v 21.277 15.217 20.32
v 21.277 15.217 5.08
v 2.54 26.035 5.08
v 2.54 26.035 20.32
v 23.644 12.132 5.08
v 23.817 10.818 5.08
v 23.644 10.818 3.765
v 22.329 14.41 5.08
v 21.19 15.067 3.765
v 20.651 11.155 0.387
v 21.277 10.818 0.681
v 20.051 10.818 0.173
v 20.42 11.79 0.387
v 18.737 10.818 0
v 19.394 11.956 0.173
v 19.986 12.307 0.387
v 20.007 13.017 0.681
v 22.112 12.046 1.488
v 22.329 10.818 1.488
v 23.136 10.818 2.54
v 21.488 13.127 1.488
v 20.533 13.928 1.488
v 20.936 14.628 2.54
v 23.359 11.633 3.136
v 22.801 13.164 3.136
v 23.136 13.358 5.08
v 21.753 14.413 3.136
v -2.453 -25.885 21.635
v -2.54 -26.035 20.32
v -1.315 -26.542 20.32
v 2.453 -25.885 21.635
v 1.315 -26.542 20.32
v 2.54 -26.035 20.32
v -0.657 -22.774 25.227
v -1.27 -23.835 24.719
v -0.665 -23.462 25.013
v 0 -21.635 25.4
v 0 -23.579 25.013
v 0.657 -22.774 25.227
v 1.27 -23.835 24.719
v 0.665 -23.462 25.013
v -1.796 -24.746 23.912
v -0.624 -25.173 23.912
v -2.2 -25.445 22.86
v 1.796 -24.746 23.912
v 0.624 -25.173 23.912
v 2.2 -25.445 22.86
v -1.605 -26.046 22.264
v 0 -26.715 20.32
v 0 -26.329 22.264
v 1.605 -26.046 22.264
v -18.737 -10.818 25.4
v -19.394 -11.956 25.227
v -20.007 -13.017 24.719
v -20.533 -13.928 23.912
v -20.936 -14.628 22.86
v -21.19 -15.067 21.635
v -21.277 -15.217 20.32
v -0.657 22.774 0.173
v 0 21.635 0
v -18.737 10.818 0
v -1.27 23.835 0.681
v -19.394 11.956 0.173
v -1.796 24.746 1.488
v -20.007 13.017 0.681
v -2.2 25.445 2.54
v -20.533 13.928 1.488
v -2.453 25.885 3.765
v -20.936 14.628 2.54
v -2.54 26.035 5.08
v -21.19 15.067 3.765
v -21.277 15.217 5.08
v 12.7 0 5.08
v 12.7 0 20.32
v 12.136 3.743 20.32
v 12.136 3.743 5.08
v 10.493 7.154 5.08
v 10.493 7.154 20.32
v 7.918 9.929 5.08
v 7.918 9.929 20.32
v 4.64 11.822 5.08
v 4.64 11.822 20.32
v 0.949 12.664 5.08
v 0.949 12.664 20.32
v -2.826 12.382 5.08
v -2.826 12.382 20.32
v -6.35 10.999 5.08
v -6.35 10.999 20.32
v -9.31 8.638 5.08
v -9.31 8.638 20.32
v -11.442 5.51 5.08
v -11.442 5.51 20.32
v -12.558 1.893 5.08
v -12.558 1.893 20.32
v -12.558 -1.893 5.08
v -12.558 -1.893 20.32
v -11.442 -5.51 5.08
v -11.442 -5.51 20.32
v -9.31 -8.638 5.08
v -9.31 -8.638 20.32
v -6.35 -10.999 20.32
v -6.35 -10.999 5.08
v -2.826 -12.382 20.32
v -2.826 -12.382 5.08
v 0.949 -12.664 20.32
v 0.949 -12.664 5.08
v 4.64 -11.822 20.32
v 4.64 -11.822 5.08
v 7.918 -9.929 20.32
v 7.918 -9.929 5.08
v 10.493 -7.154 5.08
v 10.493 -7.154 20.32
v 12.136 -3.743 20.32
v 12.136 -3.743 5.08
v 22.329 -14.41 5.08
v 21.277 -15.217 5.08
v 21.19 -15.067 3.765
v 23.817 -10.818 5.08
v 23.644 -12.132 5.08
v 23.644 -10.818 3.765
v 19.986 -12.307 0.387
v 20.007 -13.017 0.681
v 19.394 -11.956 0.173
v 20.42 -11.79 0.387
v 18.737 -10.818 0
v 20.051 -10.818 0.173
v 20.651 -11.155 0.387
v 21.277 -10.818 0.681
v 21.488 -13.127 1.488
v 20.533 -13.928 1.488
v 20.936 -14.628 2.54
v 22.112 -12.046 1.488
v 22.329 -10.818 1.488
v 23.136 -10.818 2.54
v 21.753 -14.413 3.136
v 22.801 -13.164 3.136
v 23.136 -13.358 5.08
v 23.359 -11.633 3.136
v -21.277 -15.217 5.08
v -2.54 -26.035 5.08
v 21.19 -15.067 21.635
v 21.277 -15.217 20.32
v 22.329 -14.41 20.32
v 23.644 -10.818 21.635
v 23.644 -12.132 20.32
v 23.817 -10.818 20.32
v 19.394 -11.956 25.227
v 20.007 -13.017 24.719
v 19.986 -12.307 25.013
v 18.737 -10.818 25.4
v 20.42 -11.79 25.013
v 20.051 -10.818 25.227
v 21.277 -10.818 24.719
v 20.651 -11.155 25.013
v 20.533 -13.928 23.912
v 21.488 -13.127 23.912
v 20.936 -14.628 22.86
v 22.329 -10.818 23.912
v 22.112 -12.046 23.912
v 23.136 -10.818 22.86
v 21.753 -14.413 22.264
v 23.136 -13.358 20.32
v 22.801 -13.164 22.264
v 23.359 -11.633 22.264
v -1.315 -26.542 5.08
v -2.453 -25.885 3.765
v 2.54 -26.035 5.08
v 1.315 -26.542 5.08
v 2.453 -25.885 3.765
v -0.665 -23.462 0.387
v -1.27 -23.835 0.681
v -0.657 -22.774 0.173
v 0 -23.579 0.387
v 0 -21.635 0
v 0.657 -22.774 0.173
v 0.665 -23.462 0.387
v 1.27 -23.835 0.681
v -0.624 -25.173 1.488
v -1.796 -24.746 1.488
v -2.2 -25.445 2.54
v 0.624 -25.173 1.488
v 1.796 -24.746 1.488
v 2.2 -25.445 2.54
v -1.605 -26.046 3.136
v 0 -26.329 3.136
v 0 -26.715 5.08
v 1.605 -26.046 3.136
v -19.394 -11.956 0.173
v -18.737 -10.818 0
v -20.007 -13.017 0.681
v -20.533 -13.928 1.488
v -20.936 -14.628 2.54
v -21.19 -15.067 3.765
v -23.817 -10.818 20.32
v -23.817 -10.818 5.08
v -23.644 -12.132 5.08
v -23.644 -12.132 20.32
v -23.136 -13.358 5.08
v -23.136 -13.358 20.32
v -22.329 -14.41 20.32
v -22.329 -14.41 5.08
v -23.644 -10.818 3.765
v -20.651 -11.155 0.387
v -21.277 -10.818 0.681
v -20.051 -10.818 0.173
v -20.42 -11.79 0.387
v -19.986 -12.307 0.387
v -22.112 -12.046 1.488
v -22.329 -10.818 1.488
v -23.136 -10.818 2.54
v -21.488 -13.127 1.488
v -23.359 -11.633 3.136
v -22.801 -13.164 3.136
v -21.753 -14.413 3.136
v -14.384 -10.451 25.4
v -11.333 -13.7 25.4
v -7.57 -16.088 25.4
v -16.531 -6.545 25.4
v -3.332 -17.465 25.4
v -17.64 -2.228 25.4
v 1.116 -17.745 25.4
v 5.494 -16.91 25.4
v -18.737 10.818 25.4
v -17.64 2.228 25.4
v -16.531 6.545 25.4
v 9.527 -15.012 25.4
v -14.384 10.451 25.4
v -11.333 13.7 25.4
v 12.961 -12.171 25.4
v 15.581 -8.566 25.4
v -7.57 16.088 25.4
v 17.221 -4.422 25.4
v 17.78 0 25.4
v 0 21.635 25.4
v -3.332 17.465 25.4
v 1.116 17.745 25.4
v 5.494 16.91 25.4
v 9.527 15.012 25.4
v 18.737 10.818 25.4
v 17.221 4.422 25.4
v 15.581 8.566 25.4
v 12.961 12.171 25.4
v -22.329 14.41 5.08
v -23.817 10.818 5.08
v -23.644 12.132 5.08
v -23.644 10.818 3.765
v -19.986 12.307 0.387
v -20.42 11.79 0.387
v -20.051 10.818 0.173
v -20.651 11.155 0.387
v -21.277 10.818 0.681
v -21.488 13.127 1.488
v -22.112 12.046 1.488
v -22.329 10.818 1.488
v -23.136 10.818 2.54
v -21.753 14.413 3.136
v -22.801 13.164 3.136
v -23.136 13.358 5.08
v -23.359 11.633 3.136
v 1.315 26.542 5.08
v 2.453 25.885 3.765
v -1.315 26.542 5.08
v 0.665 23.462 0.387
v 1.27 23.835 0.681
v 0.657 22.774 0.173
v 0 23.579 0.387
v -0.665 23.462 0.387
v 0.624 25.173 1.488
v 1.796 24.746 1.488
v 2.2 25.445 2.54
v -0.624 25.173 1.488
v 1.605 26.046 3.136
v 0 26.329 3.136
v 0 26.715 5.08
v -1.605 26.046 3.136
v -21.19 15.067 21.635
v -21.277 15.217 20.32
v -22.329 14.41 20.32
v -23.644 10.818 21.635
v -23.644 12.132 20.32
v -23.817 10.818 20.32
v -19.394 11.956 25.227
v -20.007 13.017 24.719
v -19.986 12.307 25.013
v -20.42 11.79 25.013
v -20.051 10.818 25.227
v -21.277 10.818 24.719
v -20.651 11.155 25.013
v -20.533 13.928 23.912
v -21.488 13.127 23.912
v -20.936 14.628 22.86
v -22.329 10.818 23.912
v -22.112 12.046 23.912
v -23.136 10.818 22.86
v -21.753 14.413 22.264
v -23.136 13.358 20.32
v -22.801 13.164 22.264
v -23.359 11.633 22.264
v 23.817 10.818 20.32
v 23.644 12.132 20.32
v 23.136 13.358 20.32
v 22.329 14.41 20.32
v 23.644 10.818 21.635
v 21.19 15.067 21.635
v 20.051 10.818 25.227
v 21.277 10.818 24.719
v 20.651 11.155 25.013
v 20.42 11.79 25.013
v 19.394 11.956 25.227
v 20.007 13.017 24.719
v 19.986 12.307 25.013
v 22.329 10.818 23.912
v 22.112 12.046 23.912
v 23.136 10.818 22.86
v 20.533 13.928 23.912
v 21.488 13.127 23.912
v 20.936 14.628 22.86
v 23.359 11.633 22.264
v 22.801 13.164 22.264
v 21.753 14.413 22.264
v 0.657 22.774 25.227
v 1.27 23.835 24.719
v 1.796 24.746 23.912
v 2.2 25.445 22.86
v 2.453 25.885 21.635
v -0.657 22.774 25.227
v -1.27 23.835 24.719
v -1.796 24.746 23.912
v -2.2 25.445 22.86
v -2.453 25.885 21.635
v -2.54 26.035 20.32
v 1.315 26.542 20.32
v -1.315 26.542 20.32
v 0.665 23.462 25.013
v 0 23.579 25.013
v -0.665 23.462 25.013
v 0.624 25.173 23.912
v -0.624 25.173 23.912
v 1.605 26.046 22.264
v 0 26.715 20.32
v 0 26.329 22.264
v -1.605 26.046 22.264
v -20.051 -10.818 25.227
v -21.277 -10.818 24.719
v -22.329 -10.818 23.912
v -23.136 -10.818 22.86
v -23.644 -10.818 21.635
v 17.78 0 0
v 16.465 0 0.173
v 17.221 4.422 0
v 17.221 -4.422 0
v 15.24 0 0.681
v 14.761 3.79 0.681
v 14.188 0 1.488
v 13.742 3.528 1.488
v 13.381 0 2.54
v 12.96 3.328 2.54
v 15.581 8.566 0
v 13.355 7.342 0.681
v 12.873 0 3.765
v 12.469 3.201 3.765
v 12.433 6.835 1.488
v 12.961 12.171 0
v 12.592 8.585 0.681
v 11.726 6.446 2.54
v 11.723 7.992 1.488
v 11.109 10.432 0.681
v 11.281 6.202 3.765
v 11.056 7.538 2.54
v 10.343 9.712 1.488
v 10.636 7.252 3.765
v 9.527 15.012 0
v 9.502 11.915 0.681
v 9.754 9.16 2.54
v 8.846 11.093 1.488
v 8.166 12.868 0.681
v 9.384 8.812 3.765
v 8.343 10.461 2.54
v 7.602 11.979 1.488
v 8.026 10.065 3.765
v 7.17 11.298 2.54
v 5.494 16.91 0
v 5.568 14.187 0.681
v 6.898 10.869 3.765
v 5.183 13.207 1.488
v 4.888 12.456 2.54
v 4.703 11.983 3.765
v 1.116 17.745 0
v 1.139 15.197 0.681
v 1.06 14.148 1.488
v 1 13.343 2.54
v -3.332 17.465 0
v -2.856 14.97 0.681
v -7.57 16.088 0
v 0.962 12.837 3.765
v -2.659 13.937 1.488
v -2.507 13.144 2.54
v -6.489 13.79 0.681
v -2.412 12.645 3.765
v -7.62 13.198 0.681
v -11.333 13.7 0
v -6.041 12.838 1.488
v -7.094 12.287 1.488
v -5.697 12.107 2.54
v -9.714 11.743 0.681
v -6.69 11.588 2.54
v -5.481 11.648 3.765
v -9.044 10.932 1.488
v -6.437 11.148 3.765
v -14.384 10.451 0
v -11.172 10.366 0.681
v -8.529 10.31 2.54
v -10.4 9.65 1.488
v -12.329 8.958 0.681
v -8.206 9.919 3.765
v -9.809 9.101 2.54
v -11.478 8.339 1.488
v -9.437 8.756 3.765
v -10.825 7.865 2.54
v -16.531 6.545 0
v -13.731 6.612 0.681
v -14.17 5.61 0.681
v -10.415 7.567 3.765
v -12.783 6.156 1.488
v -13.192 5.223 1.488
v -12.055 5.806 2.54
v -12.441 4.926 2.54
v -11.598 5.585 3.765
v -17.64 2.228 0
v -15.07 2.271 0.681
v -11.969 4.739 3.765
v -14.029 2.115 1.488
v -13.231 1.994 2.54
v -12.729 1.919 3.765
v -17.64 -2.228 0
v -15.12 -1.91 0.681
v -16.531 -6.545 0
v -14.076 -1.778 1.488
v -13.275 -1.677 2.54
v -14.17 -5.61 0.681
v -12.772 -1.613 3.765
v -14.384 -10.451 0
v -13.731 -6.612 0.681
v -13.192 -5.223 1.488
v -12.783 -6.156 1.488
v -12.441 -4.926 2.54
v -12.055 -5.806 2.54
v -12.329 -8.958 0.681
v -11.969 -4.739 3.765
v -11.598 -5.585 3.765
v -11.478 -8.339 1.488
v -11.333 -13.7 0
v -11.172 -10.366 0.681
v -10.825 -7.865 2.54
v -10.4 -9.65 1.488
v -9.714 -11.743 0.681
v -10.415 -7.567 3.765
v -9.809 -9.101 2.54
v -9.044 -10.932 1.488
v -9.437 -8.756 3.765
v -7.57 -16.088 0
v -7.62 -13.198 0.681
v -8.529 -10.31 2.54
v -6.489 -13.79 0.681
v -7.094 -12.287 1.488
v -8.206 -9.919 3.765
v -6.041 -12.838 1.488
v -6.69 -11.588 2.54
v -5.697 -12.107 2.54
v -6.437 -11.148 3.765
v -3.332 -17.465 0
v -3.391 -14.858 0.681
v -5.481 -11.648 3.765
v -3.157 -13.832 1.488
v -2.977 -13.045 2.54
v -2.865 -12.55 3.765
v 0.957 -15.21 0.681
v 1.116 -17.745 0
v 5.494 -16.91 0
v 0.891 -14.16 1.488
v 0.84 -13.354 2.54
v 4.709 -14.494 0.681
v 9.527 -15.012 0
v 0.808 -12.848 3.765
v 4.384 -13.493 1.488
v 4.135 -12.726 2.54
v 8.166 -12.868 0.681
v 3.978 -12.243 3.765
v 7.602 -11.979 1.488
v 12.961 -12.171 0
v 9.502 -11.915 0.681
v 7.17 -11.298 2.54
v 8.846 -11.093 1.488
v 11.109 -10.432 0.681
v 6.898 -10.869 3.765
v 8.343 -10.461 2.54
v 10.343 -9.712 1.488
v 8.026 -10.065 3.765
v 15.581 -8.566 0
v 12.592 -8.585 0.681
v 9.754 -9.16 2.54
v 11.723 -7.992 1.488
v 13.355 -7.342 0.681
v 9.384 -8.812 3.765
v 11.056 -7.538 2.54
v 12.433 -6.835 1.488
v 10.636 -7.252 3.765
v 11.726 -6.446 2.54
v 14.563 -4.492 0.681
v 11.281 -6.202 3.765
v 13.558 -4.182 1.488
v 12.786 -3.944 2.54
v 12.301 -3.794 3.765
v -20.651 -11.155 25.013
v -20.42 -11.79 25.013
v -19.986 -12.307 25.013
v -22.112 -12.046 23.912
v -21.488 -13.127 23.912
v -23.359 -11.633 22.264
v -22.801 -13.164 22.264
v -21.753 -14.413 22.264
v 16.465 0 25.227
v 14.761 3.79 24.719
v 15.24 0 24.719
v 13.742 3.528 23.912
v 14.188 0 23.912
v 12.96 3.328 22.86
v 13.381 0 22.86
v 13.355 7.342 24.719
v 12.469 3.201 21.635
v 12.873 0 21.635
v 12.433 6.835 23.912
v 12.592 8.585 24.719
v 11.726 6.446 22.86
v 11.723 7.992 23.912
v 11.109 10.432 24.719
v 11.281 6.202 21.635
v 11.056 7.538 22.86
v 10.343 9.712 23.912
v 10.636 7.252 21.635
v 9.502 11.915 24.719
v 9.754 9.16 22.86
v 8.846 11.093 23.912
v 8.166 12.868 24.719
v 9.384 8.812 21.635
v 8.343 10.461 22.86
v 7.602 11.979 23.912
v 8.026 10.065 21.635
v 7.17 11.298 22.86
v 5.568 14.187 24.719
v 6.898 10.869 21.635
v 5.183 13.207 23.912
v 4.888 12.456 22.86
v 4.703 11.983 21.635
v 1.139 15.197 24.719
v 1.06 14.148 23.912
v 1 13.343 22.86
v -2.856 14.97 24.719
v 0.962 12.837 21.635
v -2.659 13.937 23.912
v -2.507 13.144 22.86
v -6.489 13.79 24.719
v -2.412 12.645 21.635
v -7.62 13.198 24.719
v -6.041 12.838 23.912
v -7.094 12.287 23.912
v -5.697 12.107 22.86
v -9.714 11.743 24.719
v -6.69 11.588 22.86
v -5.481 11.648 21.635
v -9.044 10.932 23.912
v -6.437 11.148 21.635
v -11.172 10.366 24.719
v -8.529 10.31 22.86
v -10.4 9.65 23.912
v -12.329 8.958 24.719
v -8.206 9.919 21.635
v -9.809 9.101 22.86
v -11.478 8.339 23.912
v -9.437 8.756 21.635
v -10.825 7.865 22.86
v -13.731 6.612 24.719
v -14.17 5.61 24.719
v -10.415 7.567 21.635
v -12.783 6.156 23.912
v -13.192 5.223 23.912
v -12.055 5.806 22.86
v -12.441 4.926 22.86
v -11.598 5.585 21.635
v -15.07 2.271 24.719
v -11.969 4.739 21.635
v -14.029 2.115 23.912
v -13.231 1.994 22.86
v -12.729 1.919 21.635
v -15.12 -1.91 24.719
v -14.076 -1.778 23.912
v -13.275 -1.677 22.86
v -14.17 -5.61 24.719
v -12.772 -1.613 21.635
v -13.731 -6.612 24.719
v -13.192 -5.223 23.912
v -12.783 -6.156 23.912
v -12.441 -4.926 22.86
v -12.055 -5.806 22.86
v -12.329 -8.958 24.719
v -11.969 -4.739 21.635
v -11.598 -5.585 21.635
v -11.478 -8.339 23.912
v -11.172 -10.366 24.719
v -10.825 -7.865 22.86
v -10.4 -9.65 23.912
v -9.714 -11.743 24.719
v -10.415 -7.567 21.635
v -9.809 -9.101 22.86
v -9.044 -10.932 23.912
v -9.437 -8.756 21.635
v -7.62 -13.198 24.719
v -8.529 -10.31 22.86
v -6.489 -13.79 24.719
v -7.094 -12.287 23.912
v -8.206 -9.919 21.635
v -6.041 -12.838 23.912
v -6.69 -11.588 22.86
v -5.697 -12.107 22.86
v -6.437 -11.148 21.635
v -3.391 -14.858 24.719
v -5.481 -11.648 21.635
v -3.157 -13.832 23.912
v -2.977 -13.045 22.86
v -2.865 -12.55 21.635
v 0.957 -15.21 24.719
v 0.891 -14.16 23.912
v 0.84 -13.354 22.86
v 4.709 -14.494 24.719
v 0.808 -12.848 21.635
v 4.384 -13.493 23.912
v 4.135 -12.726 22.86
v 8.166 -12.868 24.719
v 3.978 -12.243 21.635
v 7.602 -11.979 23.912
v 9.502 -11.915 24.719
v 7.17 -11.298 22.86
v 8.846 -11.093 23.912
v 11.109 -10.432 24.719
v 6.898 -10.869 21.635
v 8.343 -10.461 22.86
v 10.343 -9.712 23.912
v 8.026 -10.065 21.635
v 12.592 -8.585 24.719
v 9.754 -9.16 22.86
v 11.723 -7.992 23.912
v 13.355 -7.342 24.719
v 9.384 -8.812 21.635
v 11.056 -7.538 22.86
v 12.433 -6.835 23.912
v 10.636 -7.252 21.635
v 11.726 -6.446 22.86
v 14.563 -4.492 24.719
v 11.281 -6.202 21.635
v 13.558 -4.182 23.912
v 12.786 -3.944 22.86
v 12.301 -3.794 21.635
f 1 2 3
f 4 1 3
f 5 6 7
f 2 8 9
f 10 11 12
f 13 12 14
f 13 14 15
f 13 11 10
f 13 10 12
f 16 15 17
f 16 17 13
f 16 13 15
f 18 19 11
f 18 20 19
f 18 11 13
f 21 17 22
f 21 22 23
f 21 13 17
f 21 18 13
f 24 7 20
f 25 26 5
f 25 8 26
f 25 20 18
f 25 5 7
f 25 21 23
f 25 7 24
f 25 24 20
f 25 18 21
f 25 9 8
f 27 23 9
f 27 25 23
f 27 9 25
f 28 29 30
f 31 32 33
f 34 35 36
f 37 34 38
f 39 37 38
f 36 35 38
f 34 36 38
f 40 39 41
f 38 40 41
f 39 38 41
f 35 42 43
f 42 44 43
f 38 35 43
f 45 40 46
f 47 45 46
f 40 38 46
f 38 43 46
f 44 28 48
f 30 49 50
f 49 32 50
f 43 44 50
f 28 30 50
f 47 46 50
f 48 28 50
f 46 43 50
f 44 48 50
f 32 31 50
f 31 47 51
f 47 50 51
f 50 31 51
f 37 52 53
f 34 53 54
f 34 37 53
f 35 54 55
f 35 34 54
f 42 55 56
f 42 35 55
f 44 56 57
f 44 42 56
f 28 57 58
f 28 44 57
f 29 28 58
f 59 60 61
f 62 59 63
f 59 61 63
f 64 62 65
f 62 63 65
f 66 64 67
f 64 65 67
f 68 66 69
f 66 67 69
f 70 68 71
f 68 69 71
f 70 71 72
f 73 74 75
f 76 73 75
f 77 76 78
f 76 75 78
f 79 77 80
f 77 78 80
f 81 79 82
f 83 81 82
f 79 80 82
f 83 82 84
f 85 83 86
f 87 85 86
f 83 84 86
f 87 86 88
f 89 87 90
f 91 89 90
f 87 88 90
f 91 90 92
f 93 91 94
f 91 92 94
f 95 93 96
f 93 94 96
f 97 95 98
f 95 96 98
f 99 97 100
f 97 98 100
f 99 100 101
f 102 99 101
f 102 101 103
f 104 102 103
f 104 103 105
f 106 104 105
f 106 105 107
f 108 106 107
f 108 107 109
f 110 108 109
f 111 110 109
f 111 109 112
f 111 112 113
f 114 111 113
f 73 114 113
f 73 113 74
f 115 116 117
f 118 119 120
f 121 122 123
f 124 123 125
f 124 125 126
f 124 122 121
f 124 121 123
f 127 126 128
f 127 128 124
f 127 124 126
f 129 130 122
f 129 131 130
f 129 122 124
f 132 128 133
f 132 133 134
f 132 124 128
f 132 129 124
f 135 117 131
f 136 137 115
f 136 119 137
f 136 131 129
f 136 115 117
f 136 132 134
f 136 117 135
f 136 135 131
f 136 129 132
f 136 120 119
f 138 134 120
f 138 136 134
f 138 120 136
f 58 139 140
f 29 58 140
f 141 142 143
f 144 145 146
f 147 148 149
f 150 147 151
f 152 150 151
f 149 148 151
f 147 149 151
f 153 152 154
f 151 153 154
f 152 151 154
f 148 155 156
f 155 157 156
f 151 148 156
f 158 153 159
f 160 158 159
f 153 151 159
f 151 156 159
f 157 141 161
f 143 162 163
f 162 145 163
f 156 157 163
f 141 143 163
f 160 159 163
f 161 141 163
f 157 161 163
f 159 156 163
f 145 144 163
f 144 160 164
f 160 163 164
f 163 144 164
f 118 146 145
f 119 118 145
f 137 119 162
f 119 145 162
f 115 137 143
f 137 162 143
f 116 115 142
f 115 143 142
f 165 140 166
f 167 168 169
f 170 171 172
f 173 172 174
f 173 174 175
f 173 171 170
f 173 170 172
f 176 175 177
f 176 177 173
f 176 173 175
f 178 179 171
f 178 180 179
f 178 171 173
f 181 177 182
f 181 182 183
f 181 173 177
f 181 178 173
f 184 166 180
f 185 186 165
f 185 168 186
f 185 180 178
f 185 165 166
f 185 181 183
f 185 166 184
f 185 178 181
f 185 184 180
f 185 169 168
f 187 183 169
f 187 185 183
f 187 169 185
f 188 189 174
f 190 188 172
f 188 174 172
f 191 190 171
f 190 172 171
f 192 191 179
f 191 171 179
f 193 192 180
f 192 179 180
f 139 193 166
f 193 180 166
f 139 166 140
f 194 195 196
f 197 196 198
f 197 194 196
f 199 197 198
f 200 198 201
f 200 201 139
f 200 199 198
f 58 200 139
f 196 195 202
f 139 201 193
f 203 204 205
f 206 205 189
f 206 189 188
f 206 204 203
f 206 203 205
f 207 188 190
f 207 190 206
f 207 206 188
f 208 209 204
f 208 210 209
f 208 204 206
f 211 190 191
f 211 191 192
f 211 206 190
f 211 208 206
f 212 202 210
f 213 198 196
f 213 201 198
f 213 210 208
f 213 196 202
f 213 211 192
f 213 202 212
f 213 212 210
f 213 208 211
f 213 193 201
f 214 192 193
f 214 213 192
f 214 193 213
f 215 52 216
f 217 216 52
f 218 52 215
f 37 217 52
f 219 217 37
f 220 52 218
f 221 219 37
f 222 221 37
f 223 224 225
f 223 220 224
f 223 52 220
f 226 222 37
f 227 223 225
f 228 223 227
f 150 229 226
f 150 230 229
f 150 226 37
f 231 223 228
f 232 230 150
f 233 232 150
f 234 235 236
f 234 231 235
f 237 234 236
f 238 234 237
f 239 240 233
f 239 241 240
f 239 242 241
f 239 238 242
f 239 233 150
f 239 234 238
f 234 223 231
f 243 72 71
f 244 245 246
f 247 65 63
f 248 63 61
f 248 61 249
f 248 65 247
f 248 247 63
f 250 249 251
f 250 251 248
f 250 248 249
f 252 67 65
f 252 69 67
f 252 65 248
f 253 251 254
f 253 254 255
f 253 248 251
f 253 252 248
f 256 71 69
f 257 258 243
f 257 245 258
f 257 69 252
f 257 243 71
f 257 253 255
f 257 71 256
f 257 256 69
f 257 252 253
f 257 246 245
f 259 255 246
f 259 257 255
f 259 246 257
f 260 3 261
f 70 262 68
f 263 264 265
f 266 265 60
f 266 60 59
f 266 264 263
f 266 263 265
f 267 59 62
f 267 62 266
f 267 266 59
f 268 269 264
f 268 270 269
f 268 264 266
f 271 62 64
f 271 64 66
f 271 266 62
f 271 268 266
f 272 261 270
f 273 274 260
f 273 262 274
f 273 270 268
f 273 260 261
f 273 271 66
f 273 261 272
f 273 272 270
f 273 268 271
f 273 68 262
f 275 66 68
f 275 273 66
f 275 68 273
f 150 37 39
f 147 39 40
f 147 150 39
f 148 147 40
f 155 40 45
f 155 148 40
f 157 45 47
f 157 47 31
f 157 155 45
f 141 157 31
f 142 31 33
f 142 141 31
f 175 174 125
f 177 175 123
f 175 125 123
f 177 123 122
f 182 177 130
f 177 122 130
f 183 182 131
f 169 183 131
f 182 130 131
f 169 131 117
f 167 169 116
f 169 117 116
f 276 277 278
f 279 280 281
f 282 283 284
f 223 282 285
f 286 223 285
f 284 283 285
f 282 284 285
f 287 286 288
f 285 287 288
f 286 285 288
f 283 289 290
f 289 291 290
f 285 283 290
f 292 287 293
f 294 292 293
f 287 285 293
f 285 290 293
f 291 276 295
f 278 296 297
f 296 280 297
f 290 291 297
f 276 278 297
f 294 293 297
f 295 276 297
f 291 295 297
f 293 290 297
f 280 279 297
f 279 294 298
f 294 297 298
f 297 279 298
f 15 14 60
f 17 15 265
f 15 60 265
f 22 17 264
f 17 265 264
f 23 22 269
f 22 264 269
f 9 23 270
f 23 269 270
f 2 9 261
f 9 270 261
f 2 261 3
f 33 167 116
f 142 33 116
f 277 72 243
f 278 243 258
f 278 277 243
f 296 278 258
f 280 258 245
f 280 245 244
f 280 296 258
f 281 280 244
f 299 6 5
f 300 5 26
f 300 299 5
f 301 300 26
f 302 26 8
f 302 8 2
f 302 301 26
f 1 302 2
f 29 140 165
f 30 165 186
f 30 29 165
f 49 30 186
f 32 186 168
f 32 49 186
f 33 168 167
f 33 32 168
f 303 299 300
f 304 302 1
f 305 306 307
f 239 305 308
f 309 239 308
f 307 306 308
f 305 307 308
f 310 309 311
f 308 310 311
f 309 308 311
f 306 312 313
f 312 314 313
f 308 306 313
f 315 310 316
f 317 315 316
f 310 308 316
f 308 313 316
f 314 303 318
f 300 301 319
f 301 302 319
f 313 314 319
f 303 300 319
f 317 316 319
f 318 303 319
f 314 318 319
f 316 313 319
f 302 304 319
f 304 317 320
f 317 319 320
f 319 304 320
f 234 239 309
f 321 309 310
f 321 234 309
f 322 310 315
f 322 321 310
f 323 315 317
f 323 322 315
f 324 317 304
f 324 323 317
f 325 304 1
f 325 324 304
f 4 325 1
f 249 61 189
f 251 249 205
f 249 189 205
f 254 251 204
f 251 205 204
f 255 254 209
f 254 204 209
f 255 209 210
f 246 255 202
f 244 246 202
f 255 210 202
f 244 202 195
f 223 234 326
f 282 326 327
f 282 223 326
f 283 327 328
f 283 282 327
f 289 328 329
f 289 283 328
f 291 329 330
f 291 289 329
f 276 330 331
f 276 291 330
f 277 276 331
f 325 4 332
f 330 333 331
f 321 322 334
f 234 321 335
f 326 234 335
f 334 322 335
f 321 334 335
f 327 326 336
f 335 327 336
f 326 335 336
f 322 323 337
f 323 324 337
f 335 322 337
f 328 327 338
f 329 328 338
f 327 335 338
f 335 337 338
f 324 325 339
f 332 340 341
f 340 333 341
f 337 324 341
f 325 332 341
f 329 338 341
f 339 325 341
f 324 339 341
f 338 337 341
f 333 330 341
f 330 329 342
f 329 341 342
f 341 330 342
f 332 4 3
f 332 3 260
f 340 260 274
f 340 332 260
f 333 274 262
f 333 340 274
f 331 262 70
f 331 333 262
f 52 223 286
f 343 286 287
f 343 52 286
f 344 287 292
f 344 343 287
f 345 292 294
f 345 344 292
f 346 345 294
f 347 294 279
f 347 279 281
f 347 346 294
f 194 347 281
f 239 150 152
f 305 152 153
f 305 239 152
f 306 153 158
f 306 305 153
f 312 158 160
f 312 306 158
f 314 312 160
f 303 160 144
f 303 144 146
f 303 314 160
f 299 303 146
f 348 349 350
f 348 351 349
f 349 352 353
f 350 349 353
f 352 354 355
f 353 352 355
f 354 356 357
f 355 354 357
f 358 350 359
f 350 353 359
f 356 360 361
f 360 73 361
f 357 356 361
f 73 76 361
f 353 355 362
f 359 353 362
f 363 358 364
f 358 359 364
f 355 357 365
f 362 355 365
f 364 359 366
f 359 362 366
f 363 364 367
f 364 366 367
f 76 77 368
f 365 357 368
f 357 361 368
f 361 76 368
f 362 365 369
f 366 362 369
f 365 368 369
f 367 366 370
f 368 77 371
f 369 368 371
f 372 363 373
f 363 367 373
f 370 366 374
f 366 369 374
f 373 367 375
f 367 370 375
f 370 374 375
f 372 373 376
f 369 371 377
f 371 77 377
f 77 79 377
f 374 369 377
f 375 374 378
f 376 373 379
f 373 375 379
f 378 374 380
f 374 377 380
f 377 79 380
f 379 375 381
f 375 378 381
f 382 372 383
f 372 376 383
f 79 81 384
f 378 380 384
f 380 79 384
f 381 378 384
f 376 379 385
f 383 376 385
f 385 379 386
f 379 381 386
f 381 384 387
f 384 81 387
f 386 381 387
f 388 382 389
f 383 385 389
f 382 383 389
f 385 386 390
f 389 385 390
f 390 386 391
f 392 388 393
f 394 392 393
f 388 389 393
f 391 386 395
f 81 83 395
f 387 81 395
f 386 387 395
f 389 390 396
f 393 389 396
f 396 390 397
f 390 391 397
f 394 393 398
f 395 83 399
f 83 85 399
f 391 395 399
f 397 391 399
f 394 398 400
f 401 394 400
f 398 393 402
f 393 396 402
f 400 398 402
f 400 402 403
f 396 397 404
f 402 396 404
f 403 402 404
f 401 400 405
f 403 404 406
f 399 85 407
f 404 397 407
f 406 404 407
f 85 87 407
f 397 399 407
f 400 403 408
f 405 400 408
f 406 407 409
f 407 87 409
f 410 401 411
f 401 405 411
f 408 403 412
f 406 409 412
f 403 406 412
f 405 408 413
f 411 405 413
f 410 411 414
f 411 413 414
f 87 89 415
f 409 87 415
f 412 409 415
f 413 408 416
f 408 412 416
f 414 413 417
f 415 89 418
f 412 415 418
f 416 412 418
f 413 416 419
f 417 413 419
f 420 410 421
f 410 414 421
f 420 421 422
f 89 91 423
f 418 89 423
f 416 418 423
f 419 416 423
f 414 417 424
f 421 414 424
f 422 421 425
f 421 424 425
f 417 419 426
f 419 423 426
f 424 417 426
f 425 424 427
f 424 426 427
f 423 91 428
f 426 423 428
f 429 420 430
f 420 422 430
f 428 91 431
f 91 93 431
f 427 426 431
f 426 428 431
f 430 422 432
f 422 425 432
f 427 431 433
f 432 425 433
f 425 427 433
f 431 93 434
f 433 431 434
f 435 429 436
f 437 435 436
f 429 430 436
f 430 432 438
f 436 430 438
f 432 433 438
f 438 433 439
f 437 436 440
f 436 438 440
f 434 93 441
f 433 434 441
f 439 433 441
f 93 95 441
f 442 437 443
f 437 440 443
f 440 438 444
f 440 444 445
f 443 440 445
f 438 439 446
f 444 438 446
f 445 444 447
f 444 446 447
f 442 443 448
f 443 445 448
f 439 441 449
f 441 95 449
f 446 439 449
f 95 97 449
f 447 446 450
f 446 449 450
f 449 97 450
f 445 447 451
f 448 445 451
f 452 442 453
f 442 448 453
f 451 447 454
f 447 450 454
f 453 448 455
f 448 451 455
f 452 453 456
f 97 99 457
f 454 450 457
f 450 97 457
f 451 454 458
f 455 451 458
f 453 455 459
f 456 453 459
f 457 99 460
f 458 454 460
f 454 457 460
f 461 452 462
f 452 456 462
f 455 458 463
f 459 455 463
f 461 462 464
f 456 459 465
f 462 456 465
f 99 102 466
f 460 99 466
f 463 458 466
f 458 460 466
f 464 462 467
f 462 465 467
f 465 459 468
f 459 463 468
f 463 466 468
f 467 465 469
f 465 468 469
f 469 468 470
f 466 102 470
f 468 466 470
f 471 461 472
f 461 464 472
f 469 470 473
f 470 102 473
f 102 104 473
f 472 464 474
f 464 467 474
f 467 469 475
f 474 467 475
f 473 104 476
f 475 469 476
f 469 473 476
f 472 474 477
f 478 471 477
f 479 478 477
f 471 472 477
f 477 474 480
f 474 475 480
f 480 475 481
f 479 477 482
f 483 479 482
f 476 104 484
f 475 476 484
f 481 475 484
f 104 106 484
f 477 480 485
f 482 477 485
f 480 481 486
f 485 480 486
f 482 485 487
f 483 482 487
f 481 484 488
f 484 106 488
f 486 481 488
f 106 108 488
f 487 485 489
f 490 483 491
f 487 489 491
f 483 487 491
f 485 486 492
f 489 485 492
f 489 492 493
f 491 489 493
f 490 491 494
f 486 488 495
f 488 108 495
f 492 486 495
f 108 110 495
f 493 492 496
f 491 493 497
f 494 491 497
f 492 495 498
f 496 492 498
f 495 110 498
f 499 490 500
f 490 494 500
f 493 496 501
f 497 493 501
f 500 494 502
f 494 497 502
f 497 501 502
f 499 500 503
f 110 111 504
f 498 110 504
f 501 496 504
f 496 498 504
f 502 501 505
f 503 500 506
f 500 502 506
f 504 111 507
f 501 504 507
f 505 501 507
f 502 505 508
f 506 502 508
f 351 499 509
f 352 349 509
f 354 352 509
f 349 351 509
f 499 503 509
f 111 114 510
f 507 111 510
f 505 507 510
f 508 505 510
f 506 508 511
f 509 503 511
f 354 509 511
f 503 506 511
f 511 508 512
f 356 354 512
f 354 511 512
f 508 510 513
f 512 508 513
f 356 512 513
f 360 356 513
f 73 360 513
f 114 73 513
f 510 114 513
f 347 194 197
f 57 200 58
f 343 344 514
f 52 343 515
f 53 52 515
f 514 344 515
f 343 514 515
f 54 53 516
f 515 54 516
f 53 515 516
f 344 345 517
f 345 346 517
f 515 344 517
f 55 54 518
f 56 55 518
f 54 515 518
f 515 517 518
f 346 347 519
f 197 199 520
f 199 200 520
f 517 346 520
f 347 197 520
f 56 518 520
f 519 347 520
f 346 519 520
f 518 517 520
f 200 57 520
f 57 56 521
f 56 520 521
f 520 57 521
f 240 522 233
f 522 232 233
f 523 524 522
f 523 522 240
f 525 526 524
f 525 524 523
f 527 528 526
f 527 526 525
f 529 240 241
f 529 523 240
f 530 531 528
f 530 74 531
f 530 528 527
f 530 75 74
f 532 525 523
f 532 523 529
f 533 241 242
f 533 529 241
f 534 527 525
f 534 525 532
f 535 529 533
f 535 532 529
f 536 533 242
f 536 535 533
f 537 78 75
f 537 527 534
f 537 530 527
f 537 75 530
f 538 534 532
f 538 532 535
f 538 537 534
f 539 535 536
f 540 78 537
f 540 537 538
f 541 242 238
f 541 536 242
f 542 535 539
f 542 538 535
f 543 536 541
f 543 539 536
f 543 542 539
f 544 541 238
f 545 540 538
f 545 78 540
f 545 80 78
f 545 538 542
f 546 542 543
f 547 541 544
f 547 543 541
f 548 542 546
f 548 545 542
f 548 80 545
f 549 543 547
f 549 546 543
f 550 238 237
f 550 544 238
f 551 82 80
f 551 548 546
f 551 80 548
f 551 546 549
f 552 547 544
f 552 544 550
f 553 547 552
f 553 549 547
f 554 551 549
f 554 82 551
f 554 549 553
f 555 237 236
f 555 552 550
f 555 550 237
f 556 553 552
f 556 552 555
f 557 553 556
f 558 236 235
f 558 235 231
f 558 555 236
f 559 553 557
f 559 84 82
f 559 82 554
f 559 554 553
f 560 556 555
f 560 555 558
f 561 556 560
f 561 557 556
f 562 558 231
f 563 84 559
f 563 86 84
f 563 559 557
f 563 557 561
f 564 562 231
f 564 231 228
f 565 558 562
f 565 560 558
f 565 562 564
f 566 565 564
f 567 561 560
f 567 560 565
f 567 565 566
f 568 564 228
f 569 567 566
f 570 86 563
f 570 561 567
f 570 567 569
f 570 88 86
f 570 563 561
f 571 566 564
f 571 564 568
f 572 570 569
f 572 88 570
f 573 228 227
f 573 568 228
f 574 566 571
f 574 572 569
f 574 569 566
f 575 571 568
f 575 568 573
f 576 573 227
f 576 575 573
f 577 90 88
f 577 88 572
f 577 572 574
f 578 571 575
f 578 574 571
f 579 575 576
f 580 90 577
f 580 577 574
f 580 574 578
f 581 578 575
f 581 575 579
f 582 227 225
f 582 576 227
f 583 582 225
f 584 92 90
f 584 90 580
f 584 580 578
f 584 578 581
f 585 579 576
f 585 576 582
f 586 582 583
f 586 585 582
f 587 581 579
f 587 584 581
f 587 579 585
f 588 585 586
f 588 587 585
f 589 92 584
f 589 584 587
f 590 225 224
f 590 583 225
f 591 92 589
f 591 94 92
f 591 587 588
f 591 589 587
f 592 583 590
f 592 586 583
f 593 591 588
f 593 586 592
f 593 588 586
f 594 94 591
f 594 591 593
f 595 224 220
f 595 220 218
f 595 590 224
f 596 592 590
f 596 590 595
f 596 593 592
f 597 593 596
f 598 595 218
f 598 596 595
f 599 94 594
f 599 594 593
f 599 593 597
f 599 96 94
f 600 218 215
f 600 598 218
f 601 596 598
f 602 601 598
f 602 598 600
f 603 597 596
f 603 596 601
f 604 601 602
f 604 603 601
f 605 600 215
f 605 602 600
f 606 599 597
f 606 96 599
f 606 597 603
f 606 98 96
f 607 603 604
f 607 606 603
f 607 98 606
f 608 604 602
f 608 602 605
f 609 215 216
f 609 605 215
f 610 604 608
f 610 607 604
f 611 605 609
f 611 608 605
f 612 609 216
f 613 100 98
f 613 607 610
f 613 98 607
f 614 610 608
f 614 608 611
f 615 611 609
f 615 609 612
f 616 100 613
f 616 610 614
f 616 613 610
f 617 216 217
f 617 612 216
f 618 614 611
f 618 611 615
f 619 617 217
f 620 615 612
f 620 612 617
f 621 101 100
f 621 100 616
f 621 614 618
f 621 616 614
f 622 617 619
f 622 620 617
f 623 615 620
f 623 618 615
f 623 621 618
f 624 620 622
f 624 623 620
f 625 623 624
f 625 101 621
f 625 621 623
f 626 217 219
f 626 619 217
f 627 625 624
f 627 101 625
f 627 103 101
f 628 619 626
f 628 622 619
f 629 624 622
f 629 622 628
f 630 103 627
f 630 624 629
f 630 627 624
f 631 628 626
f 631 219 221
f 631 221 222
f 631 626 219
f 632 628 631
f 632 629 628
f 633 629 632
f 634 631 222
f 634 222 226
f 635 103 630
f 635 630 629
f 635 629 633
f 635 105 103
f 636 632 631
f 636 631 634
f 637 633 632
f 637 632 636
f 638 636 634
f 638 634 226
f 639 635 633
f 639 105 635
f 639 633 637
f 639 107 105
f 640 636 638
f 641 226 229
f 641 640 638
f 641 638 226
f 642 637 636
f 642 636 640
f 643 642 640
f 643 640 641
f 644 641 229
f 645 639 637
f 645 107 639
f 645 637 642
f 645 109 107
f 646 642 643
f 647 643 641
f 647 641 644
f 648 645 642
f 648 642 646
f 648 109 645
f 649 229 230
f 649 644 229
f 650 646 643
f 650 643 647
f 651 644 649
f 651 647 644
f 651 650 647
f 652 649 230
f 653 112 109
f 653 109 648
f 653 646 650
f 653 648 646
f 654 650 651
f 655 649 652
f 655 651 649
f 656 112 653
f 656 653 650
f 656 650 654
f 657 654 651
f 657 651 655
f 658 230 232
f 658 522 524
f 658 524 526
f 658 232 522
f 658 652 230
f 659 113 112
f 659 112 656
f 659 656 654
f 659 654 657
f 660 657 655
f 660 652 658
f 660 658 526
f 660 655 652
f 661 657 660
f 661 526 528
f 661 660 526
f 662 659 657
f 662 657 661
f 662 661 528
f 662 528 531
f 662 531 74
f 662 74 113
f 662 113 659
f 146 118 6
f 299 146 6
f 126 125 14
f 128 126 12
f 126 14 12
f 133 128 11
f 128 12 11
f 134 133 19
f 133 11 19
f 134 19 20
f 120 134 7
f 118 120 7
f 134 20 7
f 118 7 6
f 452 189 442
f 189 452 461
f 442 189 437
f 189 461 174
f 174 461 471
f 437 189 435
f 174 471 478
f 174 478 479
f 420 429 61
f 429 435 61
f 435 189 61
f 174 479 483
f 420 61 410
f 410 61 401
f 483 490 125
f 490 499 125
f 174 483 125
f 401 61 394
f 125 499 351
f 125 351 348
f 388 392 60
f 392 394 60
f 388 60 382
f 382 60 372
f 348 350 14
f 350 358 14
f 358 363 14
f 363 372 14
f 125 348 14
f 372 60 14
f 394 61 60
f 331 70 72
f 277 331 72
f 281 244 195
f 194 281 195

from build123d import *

# Parameters (mm, degrees)
F1_DEPTH = 25.4
F2_R     = 5.08
F3_R     = 5.08
F4_R     = 12.7
F5_DEPTH = 25.401
F6_R     = 5.08


with BuildPart() as f1:
    # F0 (on Top) → F1 (new body)
    with BuildSketch(Plane.XY):
        Polygon((23.816695, -13.750575), (23.816695, 13.750575), (0, 27.501151), (-23.816695, 13.750575), (-23.816695, -13.750575), (0, -27.501151), align=None)
    extrude(amount=F1_DEPTH)

    # F2
    f2_edges = [f1.edges().sort_by_distance(p)[0] for p in [
        (23.816695, 13.750575, 12.7),
        (0, 27.501151, 12.7),
        (23.816695, -13.750575, 12.7),
        (0, -27.501151, 12.7),
        (-23.816695, -13.750575, 12.7),
        (-23.816695, 13.750575, 12.7),
    ]]
    fillet(f2_edges, radius=F2_R)

    # F3
    f3_edges = [f1.edges().sort_by_distance(p)[0] for p in [
        (11.908348, -20.625863, 25.4),
        (0, -26.715272, 25.4),
        (23.136104, -13.357636, 25.4),
        (-11.908348, -20.625863, 25.4),
        (23.816695, 0, 25.4),
        (-23.136104, -13.357636, 25.4),
        (23.136104, 13.357636, 25.4),
        (-23.816695, 0, 25.4),
        (11.908348, 20.625863, 25.4),
        (-23.136104, 13.357636, 25.4),
        (0, 26.715272, 25.4),
        (-11.908348, 20.625863, 25.4),
        (11.908348, -20.625863, 0),
        (0, -26.715272, 0),
        (23.136104, -13.357636, 0),
        (-11.908348, -20.625863, 0),
        (23.816695, 0, 0),
        (-23.136104, -13.357636, 0),
        (23.136104, 13.357636, 0),
        (-23.816695, 0, 0),
        (11.908348, 20.625863, 0),
        (-23.136104, 13.357636, 0),
        (0, 26.715272, 0),
        (-11.908348, 20.625863, 0),
    ]]
    fillet(f3_edges, radius=F3_R)

    # F4 (on face) → F5 (cut, through all)
    with BuildSketch(Plane.XY.offset(25.4)):
        Circle(F4_R)
    extrude(amount=-F5_DEPTH, mode=Mode.SUBTRACT)

    # F6
    f6_edges = [f1.edges().sort_by_distance(p)[0] for p in [
        (-12.7, 0, 25.4),
        (12.7, 0, 12.7),
        (-12.7, 0, 0),
    ]]
    fillet(f6_edges, radius=F6_R)


solid = f1.part
